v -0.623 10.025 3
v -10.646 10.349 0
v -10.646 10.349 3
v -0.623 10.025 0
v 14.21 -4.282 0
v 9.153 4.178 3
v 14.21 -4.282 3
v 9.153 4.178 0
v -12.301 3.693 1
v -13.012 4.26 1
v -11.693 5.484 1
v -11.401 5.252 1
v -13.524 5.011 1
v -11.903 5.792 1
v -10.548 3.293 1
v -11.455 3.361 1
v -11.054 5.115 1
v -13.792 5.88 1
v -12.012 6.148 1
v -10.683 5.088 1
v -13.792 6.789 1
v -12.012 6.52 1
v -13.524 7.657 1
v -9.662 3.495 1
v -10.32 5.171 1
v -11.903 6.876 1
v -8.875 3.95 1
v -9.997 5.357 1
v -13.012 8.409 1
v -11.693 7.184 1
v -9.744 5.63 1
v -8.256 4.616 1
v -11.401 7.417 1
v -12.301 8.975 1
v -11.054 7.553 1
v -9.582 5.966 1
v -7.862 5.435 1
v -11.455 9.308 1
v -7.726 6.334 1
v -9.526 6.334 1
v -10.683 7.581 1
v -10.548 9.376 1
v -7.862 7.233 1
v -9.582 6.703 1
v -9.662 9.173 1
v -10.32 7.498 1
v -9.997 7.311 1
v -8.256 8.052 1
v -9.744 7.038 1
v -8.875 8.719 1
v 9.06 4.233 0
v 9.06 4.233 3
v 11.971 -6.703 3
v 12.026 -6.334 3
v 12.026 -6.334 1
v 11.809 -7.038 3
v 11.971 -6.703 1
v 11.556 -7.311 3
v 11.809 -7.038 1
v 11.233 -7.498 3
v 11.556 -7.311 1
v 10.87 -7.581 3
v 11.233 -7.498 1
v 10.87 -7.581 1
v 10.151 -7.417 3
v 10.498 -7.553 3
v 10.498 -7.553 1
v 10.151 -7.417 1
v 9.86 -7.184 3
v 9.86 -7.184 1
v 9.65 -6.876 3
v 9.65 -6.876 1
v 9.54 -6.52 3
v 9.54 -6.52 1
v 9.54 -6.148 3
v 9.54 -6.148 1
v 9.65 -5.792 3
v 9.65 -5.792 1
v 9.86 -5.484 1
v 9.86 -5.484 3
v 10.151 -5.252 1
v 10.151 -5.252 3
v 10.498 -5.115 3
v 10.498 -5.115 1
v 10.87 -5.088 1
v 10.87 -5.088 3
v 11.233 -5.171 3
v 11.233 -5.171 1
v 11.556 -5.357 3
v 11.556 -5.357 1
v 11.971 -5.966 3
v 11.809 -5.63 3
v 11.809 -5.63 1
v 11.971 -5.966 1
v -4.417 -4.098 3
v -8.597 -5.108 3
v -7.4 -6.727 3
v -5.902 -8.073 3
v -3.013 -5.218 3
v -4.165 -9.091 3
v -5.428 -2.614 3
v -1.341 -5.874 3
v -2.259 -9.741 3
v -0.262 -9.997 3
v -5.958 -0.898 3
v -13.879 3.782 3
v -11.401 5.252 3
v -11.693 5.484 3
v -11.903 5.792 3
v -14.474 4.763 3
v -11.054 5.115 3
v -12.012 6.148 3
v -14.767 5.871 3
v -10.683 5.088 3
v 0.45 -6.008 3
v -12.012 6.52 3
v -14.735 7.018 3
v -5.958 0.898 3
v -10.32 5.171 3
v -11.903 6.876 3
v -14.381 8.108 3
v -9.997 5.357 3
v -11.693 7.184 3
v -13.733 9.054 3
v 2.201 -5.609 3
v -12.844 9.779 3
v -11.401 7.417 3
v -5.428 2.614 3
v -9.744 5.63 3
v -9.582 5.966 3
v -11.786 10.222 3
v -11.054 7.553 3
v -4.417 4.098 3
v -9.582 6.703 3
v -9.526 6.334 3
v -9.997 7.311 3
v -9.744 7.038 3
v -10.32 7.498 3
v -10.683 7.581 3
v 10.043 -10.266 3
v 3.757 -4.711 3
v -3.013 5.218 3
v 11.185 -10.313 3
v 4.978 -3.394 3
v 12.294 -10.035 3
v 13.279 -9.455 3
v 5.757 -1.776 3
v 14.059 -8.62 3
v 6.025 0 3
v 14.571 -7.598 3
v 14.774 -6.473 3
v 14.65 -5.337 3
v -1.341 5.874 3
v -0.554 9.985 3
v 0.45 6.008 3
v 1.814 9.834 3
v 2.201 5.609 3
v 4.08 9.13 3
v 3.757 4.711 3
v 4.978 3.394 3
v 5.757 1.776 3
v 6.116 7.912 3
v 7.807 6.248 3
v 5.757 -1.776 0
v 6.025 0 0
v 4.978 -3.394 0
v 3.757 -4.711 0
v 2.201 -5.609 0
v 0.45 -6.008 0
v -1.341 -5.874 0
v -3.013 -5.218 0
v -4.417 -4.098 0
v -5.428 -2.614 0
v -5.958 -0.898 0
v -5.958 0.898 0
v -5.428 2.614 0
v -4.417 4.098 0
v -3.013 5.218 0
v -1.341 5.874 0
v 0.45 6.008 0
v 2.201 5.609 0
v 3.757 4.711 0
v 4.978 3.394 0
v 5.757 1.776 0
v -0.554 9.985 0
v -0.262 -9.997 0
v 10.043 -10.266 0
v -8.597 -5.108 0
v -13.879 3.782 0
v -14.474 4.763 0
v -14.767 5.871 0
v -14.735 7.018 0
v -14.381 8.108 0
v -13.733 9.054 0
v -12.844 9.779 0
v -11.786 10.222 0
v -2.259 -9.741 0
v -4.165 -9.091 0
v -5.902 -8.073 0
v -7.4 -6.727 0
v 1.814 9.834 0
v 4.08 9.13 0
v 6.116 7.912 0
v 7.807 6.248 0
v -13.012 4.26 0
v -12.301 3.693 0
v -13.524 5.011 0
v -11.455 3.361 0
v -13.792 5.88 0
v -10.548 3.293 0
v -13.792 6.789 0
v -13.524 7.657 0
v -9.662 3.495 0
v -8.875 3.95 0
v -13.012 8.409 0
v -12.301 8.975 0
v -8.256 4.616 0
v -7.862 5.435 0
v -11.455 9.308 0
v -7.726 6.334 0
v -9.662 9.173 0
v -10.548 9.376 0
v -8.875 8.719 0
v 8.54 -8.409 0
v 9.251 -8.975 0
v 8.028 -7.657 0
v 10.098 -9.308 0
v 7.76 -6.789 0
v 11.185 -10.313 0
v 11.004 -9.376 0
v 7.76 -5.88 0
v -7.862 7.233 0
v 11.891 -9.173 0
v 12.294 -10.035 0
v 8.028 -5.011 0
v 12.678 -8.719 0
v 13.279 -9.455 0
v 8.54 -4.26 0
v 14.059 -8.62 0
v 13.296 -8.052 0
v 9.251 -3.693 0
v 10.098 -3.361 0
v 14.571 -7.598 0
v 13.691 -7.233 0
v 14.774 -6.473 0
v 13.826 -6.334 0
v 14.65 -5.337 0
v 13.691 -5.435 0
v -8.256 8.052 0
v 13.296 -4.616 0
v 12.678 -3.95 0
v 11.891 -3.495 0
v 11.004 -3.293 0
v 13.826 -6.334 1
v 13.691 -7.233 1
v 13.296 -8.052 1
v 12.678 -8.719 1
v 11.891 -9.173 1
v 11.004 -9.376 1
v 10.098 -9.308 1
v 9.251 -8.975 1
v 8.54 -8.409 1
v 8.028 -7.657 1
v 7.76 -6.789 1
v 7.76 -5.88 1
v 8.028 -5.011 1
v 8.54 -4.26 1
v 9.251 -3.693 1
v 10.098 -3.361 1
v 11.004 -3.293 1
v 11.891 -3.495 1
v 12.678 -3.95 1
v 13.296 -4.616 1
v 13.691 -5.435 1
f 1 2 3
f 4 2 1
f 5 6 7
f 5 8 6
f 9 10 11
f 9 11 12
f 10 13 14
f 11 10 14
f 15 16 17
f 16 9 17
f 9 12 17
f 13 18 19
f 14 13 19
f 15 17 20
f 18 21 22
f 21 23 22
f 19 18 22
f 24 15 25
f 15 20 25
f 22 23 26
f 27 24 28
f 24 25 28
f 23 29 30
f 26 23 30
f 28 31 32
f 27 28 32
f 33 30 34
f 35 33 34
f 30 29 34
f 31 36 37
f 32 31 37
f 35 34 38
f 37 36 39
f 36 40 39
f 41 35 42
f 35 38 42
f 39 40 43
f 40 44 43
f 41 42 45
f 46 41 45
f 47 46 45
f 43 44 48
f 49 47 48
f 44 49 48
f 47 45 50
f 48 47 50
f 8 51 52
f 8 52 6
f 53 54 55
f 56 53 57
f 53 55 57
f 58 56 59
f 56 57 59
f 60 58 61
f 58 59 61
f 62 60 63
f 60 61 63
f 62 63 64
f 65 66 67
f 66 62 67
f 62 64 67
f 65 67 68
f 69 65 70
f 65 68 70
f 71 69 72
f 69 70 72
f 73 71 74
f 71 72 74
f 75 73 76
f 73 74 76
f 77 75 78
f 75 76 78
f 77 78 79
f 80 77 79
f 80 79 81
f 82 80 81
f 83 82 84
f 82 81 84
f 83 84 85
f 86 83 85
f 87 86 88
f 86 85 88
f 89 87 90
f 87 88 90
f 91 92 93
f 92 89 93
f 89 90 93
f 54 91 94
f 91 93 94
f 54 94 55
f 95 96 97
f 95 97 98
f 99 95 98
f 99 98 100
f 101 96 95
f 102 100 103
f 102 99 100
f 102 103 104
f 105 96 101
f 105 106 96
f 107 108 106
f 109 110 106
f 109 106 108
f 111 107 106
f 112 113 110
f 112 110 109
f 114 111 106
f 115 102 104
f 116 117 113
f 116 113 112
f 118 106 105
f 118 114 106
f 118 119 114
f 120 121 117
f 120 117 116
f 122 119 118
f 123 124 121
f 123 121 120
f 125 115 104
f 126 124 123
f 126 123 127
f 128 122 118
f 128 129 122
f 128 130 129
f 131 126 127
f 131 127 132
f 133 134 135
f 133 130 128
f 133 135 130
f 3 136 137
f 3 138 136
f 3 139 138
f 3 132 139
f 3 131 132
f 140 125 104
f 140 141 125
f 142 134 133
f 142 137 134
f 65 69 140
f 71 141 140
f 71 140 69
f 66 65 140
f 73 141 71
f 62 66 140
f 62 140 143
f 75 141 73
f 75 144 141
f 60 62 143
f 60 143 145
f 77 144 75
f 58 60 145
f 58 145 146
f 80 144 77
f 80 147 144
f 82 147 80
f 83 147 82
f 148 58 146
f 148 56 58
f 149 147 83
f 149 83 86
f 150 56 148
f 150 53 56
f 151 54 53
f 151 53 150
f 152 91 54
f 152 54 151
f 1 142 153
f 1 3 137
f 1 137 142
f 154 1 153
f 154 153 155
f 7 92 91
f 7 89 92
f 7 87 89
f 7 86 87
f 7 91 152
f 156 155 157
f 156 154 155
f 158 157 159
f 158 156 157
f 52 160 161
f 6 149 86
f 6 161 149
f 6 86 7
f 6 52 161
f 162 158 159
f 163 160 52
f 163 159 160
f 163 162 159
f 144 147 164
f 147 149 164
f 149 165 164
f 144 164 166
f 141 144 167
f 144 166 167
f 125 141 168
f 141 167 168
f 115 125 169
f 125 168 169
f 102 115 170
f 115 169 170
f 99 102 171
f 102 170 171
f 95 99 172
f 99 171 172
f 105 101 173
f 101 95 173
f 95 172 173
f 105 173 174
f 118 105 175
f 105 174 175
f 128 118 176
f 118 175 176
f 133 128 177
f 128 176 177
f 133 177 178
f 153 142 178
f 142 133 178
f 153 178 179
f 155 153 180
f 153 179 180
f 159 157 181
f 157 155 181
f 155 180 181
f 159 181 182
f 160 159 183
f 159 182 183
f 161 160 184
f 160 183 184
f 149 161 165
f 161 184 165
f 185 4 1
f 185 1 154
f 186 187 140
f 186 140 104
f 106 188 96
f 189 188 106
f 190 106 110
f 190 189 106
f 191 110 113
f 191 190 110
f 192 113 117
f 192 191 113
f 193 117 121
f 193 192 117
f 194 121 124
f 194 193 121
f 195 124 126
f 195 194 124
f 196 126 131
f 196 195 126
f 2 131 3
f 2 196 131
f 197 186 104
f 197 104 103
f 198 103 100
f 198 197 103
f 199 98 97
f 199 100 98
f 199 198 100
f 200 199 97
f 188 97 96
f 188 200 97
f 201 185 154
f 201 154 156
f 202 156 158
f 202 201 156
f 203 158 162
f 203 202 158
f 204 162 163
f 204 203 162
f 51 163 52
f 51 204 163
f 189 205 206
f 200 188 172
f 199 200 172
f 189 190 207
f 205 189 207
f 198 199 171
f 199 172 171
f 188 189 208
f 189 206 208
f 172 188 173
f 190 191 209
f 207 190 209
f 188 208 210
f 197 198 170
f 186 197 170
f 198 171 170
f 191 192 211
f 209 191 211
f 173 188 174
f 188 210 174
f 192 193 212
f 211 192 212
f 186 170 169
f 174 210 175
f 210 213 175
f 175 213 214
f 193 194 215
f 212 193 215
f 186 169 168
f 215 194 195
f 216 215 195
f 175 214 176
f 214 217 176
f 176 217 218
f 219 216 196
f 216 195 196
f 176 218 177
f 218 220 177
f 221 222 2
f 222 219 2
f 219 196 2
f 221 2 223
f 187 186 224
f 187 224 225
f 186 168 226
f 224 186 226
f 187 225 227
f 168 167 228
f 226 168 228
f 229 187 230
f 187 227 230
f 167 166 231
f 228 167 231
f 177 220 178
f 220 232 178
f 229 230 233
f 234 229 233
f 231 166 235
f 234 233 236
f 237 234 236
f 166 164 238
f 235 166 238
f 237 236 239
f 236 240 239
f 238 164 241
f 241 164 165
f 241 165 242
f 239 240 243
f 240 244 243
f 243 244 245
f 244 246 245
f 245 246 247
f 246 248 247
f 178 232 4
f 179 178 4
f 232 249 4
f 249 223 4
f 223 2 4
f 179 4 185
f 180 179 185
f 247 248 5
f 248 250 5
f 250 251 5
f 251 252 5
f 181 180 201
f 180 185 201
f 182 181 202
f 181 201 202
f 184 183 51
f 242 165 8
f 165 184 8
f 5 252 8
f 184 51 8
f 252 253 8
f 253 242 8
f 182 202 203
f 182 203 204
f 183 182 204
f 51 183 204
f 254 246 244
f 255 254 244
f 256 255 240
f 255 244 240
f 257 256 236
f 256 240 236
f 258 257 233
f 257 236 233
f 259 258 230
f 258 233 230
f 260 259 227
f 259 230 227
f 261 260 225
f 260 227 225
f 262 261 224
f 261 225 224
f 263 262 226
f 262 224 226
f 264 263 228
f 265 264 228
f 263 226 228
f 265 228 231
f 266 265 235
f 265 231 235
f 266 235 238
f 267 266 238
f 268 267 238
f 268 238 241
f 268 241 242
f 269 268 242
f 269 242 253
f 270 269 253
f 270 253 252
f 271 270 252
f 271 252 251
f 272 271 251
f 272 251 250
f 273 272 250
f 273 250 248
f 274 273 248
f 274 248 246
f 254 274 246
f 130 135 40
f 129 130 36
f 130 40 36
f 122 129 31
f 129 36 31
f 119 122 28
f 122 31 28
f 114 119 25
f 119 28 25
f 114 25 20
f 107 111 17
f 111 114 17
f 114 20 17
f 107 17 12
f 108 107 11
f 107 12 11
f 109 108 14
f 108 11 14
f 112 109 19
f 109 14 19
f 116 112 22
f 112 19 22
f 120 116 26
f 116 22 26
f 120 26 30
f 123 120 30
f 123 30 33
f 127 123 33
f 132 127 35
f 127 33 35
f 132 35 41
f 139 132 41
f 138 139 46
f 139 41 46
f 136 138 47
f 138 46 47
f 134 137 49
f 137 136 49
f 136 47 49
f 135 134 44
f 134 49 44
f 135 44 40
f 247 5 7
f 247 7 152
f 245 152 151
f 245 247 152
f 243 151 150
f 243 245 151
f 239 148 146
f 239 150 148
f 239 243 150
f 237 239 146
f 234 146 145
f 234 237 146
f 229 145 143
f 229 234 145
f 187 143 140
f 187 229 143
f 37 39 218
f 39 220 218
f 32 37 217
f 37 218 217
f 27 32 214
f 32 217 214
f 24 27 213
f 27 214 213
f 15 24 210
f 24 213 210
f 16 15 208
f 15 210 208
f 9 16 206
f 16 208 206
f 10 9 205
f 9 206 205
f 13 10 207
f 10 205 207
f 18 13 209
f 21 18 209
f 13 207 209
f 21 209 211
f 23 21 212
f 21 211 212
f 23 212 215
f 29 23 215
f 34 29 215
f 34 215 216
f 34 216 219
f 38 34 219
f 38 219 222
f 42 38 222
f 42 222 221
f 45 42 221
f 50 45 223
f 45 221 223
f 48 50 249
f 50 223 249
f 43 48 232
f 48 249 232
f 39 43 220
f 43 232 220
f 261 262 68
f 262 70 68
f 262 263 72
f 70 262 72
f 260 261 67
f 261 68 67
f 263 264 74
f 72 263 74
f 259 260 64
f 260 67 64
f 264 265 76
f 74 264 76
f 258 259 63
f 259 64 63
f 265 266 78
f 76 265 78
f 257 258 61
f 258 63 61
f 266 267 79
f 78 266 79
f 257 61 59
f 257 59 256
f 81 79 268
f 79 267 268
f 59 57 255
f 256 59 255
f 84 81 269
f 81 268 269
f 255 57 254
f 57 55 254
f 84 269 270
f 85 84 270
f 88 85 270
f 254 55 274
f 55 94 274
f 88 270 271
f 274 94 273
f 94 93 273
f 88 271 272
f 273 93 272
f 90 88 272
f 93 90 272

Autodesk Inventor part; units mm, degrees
ref_plane "YZ Plane" through (0, 0, 0) normal (1, 0, 0) x (0, 1, 0)
ref_plane "XZ Plane" through (0, 0, 0) normal (0, 1, 0) x (-1, 0, 0)
ref_plane "XY Plane" through (0, 0, 0) normal (0, 0, 1) x (1, 0, 0)
sketch "スケッチ1" plane through (0, 0, 0) normal (0, 0, 1) x (1, 0, 0)
  line L0 (0, 0) -> (-26.8716, 23) construction
  line L1 (32.7705, -12.2921) -> (0, 0) construction
  circle A0 centre (0, 0) radius 8
  circle A1 centre (0, 0) radius 6.025
  circle A2 centre (0, 0) radius 10
  line L2 (30.3398, -14.0505) -> (4.0407, -9.1473)
  line L3 (9.0597, 4.2333) -> (32.0958, -9.369)
  line L4 (-23.9861, 23.821) -> (-0.5538, 9.9847)
  line L5 (-9.9505, -0.9938) -> (-27.2374, 20.0224)
  circle A3 centre (-10.7763, 6.3341) radius 3.05
  circle A4 centre (-10.7763, 6.3341) radius 1.25
  circle A5 centre (10.7763, -6.3341) radius 3.05
  circle A6 centre (10.7763, -6.3341) radius 1.25
  arc A7 (-10.6465, 10.3494) -> (-13.8789, 3.7821) centre (-10.7763, 6.3341) ccw
  arc A8 (10.0432, -10.2664) -> (14.2097, -4.2819) centre (10.7763, -6.3341) ccw
  line L6 (-10.6465, 10.3494) -> (0.3231, 9.9948)
  line L7 (8.5835, 5.1307) -> (14.2097, -4.2819)
  line L8 (10.0432, -10.2664) -> (-0.2617, -9.9966)
  line L9 (-8.5971, -5.1078) -> (-13.8789, 3.7821)
  point P0 (-0.6227, 10.0254)
  point P1 (9.1526, 4.1785)
  dimension "d0" = 12.05
  dimension "d5" = 2.5
extrude "押し出し1" add sketch "スケッチ1" along normal blind 3 contours A0 | A2 A5 A3 | A2 L3 L7 A8 L2 A5 | A5 A2 | A2 A5 | L2 L8 A2 | A2 A3 L5 A7 L6 L4 | A3 A2 | A2 A3 | L9 L5 A2
extrude "押し出し2" cut sketch "スケッチ1" along normal blind 1 contours A5 A2 | A2 A5 | A3 A2 | A2 A3 | A4 | A6
properties part number "モータマウント2" material "アルミニウム 2014-T4"
